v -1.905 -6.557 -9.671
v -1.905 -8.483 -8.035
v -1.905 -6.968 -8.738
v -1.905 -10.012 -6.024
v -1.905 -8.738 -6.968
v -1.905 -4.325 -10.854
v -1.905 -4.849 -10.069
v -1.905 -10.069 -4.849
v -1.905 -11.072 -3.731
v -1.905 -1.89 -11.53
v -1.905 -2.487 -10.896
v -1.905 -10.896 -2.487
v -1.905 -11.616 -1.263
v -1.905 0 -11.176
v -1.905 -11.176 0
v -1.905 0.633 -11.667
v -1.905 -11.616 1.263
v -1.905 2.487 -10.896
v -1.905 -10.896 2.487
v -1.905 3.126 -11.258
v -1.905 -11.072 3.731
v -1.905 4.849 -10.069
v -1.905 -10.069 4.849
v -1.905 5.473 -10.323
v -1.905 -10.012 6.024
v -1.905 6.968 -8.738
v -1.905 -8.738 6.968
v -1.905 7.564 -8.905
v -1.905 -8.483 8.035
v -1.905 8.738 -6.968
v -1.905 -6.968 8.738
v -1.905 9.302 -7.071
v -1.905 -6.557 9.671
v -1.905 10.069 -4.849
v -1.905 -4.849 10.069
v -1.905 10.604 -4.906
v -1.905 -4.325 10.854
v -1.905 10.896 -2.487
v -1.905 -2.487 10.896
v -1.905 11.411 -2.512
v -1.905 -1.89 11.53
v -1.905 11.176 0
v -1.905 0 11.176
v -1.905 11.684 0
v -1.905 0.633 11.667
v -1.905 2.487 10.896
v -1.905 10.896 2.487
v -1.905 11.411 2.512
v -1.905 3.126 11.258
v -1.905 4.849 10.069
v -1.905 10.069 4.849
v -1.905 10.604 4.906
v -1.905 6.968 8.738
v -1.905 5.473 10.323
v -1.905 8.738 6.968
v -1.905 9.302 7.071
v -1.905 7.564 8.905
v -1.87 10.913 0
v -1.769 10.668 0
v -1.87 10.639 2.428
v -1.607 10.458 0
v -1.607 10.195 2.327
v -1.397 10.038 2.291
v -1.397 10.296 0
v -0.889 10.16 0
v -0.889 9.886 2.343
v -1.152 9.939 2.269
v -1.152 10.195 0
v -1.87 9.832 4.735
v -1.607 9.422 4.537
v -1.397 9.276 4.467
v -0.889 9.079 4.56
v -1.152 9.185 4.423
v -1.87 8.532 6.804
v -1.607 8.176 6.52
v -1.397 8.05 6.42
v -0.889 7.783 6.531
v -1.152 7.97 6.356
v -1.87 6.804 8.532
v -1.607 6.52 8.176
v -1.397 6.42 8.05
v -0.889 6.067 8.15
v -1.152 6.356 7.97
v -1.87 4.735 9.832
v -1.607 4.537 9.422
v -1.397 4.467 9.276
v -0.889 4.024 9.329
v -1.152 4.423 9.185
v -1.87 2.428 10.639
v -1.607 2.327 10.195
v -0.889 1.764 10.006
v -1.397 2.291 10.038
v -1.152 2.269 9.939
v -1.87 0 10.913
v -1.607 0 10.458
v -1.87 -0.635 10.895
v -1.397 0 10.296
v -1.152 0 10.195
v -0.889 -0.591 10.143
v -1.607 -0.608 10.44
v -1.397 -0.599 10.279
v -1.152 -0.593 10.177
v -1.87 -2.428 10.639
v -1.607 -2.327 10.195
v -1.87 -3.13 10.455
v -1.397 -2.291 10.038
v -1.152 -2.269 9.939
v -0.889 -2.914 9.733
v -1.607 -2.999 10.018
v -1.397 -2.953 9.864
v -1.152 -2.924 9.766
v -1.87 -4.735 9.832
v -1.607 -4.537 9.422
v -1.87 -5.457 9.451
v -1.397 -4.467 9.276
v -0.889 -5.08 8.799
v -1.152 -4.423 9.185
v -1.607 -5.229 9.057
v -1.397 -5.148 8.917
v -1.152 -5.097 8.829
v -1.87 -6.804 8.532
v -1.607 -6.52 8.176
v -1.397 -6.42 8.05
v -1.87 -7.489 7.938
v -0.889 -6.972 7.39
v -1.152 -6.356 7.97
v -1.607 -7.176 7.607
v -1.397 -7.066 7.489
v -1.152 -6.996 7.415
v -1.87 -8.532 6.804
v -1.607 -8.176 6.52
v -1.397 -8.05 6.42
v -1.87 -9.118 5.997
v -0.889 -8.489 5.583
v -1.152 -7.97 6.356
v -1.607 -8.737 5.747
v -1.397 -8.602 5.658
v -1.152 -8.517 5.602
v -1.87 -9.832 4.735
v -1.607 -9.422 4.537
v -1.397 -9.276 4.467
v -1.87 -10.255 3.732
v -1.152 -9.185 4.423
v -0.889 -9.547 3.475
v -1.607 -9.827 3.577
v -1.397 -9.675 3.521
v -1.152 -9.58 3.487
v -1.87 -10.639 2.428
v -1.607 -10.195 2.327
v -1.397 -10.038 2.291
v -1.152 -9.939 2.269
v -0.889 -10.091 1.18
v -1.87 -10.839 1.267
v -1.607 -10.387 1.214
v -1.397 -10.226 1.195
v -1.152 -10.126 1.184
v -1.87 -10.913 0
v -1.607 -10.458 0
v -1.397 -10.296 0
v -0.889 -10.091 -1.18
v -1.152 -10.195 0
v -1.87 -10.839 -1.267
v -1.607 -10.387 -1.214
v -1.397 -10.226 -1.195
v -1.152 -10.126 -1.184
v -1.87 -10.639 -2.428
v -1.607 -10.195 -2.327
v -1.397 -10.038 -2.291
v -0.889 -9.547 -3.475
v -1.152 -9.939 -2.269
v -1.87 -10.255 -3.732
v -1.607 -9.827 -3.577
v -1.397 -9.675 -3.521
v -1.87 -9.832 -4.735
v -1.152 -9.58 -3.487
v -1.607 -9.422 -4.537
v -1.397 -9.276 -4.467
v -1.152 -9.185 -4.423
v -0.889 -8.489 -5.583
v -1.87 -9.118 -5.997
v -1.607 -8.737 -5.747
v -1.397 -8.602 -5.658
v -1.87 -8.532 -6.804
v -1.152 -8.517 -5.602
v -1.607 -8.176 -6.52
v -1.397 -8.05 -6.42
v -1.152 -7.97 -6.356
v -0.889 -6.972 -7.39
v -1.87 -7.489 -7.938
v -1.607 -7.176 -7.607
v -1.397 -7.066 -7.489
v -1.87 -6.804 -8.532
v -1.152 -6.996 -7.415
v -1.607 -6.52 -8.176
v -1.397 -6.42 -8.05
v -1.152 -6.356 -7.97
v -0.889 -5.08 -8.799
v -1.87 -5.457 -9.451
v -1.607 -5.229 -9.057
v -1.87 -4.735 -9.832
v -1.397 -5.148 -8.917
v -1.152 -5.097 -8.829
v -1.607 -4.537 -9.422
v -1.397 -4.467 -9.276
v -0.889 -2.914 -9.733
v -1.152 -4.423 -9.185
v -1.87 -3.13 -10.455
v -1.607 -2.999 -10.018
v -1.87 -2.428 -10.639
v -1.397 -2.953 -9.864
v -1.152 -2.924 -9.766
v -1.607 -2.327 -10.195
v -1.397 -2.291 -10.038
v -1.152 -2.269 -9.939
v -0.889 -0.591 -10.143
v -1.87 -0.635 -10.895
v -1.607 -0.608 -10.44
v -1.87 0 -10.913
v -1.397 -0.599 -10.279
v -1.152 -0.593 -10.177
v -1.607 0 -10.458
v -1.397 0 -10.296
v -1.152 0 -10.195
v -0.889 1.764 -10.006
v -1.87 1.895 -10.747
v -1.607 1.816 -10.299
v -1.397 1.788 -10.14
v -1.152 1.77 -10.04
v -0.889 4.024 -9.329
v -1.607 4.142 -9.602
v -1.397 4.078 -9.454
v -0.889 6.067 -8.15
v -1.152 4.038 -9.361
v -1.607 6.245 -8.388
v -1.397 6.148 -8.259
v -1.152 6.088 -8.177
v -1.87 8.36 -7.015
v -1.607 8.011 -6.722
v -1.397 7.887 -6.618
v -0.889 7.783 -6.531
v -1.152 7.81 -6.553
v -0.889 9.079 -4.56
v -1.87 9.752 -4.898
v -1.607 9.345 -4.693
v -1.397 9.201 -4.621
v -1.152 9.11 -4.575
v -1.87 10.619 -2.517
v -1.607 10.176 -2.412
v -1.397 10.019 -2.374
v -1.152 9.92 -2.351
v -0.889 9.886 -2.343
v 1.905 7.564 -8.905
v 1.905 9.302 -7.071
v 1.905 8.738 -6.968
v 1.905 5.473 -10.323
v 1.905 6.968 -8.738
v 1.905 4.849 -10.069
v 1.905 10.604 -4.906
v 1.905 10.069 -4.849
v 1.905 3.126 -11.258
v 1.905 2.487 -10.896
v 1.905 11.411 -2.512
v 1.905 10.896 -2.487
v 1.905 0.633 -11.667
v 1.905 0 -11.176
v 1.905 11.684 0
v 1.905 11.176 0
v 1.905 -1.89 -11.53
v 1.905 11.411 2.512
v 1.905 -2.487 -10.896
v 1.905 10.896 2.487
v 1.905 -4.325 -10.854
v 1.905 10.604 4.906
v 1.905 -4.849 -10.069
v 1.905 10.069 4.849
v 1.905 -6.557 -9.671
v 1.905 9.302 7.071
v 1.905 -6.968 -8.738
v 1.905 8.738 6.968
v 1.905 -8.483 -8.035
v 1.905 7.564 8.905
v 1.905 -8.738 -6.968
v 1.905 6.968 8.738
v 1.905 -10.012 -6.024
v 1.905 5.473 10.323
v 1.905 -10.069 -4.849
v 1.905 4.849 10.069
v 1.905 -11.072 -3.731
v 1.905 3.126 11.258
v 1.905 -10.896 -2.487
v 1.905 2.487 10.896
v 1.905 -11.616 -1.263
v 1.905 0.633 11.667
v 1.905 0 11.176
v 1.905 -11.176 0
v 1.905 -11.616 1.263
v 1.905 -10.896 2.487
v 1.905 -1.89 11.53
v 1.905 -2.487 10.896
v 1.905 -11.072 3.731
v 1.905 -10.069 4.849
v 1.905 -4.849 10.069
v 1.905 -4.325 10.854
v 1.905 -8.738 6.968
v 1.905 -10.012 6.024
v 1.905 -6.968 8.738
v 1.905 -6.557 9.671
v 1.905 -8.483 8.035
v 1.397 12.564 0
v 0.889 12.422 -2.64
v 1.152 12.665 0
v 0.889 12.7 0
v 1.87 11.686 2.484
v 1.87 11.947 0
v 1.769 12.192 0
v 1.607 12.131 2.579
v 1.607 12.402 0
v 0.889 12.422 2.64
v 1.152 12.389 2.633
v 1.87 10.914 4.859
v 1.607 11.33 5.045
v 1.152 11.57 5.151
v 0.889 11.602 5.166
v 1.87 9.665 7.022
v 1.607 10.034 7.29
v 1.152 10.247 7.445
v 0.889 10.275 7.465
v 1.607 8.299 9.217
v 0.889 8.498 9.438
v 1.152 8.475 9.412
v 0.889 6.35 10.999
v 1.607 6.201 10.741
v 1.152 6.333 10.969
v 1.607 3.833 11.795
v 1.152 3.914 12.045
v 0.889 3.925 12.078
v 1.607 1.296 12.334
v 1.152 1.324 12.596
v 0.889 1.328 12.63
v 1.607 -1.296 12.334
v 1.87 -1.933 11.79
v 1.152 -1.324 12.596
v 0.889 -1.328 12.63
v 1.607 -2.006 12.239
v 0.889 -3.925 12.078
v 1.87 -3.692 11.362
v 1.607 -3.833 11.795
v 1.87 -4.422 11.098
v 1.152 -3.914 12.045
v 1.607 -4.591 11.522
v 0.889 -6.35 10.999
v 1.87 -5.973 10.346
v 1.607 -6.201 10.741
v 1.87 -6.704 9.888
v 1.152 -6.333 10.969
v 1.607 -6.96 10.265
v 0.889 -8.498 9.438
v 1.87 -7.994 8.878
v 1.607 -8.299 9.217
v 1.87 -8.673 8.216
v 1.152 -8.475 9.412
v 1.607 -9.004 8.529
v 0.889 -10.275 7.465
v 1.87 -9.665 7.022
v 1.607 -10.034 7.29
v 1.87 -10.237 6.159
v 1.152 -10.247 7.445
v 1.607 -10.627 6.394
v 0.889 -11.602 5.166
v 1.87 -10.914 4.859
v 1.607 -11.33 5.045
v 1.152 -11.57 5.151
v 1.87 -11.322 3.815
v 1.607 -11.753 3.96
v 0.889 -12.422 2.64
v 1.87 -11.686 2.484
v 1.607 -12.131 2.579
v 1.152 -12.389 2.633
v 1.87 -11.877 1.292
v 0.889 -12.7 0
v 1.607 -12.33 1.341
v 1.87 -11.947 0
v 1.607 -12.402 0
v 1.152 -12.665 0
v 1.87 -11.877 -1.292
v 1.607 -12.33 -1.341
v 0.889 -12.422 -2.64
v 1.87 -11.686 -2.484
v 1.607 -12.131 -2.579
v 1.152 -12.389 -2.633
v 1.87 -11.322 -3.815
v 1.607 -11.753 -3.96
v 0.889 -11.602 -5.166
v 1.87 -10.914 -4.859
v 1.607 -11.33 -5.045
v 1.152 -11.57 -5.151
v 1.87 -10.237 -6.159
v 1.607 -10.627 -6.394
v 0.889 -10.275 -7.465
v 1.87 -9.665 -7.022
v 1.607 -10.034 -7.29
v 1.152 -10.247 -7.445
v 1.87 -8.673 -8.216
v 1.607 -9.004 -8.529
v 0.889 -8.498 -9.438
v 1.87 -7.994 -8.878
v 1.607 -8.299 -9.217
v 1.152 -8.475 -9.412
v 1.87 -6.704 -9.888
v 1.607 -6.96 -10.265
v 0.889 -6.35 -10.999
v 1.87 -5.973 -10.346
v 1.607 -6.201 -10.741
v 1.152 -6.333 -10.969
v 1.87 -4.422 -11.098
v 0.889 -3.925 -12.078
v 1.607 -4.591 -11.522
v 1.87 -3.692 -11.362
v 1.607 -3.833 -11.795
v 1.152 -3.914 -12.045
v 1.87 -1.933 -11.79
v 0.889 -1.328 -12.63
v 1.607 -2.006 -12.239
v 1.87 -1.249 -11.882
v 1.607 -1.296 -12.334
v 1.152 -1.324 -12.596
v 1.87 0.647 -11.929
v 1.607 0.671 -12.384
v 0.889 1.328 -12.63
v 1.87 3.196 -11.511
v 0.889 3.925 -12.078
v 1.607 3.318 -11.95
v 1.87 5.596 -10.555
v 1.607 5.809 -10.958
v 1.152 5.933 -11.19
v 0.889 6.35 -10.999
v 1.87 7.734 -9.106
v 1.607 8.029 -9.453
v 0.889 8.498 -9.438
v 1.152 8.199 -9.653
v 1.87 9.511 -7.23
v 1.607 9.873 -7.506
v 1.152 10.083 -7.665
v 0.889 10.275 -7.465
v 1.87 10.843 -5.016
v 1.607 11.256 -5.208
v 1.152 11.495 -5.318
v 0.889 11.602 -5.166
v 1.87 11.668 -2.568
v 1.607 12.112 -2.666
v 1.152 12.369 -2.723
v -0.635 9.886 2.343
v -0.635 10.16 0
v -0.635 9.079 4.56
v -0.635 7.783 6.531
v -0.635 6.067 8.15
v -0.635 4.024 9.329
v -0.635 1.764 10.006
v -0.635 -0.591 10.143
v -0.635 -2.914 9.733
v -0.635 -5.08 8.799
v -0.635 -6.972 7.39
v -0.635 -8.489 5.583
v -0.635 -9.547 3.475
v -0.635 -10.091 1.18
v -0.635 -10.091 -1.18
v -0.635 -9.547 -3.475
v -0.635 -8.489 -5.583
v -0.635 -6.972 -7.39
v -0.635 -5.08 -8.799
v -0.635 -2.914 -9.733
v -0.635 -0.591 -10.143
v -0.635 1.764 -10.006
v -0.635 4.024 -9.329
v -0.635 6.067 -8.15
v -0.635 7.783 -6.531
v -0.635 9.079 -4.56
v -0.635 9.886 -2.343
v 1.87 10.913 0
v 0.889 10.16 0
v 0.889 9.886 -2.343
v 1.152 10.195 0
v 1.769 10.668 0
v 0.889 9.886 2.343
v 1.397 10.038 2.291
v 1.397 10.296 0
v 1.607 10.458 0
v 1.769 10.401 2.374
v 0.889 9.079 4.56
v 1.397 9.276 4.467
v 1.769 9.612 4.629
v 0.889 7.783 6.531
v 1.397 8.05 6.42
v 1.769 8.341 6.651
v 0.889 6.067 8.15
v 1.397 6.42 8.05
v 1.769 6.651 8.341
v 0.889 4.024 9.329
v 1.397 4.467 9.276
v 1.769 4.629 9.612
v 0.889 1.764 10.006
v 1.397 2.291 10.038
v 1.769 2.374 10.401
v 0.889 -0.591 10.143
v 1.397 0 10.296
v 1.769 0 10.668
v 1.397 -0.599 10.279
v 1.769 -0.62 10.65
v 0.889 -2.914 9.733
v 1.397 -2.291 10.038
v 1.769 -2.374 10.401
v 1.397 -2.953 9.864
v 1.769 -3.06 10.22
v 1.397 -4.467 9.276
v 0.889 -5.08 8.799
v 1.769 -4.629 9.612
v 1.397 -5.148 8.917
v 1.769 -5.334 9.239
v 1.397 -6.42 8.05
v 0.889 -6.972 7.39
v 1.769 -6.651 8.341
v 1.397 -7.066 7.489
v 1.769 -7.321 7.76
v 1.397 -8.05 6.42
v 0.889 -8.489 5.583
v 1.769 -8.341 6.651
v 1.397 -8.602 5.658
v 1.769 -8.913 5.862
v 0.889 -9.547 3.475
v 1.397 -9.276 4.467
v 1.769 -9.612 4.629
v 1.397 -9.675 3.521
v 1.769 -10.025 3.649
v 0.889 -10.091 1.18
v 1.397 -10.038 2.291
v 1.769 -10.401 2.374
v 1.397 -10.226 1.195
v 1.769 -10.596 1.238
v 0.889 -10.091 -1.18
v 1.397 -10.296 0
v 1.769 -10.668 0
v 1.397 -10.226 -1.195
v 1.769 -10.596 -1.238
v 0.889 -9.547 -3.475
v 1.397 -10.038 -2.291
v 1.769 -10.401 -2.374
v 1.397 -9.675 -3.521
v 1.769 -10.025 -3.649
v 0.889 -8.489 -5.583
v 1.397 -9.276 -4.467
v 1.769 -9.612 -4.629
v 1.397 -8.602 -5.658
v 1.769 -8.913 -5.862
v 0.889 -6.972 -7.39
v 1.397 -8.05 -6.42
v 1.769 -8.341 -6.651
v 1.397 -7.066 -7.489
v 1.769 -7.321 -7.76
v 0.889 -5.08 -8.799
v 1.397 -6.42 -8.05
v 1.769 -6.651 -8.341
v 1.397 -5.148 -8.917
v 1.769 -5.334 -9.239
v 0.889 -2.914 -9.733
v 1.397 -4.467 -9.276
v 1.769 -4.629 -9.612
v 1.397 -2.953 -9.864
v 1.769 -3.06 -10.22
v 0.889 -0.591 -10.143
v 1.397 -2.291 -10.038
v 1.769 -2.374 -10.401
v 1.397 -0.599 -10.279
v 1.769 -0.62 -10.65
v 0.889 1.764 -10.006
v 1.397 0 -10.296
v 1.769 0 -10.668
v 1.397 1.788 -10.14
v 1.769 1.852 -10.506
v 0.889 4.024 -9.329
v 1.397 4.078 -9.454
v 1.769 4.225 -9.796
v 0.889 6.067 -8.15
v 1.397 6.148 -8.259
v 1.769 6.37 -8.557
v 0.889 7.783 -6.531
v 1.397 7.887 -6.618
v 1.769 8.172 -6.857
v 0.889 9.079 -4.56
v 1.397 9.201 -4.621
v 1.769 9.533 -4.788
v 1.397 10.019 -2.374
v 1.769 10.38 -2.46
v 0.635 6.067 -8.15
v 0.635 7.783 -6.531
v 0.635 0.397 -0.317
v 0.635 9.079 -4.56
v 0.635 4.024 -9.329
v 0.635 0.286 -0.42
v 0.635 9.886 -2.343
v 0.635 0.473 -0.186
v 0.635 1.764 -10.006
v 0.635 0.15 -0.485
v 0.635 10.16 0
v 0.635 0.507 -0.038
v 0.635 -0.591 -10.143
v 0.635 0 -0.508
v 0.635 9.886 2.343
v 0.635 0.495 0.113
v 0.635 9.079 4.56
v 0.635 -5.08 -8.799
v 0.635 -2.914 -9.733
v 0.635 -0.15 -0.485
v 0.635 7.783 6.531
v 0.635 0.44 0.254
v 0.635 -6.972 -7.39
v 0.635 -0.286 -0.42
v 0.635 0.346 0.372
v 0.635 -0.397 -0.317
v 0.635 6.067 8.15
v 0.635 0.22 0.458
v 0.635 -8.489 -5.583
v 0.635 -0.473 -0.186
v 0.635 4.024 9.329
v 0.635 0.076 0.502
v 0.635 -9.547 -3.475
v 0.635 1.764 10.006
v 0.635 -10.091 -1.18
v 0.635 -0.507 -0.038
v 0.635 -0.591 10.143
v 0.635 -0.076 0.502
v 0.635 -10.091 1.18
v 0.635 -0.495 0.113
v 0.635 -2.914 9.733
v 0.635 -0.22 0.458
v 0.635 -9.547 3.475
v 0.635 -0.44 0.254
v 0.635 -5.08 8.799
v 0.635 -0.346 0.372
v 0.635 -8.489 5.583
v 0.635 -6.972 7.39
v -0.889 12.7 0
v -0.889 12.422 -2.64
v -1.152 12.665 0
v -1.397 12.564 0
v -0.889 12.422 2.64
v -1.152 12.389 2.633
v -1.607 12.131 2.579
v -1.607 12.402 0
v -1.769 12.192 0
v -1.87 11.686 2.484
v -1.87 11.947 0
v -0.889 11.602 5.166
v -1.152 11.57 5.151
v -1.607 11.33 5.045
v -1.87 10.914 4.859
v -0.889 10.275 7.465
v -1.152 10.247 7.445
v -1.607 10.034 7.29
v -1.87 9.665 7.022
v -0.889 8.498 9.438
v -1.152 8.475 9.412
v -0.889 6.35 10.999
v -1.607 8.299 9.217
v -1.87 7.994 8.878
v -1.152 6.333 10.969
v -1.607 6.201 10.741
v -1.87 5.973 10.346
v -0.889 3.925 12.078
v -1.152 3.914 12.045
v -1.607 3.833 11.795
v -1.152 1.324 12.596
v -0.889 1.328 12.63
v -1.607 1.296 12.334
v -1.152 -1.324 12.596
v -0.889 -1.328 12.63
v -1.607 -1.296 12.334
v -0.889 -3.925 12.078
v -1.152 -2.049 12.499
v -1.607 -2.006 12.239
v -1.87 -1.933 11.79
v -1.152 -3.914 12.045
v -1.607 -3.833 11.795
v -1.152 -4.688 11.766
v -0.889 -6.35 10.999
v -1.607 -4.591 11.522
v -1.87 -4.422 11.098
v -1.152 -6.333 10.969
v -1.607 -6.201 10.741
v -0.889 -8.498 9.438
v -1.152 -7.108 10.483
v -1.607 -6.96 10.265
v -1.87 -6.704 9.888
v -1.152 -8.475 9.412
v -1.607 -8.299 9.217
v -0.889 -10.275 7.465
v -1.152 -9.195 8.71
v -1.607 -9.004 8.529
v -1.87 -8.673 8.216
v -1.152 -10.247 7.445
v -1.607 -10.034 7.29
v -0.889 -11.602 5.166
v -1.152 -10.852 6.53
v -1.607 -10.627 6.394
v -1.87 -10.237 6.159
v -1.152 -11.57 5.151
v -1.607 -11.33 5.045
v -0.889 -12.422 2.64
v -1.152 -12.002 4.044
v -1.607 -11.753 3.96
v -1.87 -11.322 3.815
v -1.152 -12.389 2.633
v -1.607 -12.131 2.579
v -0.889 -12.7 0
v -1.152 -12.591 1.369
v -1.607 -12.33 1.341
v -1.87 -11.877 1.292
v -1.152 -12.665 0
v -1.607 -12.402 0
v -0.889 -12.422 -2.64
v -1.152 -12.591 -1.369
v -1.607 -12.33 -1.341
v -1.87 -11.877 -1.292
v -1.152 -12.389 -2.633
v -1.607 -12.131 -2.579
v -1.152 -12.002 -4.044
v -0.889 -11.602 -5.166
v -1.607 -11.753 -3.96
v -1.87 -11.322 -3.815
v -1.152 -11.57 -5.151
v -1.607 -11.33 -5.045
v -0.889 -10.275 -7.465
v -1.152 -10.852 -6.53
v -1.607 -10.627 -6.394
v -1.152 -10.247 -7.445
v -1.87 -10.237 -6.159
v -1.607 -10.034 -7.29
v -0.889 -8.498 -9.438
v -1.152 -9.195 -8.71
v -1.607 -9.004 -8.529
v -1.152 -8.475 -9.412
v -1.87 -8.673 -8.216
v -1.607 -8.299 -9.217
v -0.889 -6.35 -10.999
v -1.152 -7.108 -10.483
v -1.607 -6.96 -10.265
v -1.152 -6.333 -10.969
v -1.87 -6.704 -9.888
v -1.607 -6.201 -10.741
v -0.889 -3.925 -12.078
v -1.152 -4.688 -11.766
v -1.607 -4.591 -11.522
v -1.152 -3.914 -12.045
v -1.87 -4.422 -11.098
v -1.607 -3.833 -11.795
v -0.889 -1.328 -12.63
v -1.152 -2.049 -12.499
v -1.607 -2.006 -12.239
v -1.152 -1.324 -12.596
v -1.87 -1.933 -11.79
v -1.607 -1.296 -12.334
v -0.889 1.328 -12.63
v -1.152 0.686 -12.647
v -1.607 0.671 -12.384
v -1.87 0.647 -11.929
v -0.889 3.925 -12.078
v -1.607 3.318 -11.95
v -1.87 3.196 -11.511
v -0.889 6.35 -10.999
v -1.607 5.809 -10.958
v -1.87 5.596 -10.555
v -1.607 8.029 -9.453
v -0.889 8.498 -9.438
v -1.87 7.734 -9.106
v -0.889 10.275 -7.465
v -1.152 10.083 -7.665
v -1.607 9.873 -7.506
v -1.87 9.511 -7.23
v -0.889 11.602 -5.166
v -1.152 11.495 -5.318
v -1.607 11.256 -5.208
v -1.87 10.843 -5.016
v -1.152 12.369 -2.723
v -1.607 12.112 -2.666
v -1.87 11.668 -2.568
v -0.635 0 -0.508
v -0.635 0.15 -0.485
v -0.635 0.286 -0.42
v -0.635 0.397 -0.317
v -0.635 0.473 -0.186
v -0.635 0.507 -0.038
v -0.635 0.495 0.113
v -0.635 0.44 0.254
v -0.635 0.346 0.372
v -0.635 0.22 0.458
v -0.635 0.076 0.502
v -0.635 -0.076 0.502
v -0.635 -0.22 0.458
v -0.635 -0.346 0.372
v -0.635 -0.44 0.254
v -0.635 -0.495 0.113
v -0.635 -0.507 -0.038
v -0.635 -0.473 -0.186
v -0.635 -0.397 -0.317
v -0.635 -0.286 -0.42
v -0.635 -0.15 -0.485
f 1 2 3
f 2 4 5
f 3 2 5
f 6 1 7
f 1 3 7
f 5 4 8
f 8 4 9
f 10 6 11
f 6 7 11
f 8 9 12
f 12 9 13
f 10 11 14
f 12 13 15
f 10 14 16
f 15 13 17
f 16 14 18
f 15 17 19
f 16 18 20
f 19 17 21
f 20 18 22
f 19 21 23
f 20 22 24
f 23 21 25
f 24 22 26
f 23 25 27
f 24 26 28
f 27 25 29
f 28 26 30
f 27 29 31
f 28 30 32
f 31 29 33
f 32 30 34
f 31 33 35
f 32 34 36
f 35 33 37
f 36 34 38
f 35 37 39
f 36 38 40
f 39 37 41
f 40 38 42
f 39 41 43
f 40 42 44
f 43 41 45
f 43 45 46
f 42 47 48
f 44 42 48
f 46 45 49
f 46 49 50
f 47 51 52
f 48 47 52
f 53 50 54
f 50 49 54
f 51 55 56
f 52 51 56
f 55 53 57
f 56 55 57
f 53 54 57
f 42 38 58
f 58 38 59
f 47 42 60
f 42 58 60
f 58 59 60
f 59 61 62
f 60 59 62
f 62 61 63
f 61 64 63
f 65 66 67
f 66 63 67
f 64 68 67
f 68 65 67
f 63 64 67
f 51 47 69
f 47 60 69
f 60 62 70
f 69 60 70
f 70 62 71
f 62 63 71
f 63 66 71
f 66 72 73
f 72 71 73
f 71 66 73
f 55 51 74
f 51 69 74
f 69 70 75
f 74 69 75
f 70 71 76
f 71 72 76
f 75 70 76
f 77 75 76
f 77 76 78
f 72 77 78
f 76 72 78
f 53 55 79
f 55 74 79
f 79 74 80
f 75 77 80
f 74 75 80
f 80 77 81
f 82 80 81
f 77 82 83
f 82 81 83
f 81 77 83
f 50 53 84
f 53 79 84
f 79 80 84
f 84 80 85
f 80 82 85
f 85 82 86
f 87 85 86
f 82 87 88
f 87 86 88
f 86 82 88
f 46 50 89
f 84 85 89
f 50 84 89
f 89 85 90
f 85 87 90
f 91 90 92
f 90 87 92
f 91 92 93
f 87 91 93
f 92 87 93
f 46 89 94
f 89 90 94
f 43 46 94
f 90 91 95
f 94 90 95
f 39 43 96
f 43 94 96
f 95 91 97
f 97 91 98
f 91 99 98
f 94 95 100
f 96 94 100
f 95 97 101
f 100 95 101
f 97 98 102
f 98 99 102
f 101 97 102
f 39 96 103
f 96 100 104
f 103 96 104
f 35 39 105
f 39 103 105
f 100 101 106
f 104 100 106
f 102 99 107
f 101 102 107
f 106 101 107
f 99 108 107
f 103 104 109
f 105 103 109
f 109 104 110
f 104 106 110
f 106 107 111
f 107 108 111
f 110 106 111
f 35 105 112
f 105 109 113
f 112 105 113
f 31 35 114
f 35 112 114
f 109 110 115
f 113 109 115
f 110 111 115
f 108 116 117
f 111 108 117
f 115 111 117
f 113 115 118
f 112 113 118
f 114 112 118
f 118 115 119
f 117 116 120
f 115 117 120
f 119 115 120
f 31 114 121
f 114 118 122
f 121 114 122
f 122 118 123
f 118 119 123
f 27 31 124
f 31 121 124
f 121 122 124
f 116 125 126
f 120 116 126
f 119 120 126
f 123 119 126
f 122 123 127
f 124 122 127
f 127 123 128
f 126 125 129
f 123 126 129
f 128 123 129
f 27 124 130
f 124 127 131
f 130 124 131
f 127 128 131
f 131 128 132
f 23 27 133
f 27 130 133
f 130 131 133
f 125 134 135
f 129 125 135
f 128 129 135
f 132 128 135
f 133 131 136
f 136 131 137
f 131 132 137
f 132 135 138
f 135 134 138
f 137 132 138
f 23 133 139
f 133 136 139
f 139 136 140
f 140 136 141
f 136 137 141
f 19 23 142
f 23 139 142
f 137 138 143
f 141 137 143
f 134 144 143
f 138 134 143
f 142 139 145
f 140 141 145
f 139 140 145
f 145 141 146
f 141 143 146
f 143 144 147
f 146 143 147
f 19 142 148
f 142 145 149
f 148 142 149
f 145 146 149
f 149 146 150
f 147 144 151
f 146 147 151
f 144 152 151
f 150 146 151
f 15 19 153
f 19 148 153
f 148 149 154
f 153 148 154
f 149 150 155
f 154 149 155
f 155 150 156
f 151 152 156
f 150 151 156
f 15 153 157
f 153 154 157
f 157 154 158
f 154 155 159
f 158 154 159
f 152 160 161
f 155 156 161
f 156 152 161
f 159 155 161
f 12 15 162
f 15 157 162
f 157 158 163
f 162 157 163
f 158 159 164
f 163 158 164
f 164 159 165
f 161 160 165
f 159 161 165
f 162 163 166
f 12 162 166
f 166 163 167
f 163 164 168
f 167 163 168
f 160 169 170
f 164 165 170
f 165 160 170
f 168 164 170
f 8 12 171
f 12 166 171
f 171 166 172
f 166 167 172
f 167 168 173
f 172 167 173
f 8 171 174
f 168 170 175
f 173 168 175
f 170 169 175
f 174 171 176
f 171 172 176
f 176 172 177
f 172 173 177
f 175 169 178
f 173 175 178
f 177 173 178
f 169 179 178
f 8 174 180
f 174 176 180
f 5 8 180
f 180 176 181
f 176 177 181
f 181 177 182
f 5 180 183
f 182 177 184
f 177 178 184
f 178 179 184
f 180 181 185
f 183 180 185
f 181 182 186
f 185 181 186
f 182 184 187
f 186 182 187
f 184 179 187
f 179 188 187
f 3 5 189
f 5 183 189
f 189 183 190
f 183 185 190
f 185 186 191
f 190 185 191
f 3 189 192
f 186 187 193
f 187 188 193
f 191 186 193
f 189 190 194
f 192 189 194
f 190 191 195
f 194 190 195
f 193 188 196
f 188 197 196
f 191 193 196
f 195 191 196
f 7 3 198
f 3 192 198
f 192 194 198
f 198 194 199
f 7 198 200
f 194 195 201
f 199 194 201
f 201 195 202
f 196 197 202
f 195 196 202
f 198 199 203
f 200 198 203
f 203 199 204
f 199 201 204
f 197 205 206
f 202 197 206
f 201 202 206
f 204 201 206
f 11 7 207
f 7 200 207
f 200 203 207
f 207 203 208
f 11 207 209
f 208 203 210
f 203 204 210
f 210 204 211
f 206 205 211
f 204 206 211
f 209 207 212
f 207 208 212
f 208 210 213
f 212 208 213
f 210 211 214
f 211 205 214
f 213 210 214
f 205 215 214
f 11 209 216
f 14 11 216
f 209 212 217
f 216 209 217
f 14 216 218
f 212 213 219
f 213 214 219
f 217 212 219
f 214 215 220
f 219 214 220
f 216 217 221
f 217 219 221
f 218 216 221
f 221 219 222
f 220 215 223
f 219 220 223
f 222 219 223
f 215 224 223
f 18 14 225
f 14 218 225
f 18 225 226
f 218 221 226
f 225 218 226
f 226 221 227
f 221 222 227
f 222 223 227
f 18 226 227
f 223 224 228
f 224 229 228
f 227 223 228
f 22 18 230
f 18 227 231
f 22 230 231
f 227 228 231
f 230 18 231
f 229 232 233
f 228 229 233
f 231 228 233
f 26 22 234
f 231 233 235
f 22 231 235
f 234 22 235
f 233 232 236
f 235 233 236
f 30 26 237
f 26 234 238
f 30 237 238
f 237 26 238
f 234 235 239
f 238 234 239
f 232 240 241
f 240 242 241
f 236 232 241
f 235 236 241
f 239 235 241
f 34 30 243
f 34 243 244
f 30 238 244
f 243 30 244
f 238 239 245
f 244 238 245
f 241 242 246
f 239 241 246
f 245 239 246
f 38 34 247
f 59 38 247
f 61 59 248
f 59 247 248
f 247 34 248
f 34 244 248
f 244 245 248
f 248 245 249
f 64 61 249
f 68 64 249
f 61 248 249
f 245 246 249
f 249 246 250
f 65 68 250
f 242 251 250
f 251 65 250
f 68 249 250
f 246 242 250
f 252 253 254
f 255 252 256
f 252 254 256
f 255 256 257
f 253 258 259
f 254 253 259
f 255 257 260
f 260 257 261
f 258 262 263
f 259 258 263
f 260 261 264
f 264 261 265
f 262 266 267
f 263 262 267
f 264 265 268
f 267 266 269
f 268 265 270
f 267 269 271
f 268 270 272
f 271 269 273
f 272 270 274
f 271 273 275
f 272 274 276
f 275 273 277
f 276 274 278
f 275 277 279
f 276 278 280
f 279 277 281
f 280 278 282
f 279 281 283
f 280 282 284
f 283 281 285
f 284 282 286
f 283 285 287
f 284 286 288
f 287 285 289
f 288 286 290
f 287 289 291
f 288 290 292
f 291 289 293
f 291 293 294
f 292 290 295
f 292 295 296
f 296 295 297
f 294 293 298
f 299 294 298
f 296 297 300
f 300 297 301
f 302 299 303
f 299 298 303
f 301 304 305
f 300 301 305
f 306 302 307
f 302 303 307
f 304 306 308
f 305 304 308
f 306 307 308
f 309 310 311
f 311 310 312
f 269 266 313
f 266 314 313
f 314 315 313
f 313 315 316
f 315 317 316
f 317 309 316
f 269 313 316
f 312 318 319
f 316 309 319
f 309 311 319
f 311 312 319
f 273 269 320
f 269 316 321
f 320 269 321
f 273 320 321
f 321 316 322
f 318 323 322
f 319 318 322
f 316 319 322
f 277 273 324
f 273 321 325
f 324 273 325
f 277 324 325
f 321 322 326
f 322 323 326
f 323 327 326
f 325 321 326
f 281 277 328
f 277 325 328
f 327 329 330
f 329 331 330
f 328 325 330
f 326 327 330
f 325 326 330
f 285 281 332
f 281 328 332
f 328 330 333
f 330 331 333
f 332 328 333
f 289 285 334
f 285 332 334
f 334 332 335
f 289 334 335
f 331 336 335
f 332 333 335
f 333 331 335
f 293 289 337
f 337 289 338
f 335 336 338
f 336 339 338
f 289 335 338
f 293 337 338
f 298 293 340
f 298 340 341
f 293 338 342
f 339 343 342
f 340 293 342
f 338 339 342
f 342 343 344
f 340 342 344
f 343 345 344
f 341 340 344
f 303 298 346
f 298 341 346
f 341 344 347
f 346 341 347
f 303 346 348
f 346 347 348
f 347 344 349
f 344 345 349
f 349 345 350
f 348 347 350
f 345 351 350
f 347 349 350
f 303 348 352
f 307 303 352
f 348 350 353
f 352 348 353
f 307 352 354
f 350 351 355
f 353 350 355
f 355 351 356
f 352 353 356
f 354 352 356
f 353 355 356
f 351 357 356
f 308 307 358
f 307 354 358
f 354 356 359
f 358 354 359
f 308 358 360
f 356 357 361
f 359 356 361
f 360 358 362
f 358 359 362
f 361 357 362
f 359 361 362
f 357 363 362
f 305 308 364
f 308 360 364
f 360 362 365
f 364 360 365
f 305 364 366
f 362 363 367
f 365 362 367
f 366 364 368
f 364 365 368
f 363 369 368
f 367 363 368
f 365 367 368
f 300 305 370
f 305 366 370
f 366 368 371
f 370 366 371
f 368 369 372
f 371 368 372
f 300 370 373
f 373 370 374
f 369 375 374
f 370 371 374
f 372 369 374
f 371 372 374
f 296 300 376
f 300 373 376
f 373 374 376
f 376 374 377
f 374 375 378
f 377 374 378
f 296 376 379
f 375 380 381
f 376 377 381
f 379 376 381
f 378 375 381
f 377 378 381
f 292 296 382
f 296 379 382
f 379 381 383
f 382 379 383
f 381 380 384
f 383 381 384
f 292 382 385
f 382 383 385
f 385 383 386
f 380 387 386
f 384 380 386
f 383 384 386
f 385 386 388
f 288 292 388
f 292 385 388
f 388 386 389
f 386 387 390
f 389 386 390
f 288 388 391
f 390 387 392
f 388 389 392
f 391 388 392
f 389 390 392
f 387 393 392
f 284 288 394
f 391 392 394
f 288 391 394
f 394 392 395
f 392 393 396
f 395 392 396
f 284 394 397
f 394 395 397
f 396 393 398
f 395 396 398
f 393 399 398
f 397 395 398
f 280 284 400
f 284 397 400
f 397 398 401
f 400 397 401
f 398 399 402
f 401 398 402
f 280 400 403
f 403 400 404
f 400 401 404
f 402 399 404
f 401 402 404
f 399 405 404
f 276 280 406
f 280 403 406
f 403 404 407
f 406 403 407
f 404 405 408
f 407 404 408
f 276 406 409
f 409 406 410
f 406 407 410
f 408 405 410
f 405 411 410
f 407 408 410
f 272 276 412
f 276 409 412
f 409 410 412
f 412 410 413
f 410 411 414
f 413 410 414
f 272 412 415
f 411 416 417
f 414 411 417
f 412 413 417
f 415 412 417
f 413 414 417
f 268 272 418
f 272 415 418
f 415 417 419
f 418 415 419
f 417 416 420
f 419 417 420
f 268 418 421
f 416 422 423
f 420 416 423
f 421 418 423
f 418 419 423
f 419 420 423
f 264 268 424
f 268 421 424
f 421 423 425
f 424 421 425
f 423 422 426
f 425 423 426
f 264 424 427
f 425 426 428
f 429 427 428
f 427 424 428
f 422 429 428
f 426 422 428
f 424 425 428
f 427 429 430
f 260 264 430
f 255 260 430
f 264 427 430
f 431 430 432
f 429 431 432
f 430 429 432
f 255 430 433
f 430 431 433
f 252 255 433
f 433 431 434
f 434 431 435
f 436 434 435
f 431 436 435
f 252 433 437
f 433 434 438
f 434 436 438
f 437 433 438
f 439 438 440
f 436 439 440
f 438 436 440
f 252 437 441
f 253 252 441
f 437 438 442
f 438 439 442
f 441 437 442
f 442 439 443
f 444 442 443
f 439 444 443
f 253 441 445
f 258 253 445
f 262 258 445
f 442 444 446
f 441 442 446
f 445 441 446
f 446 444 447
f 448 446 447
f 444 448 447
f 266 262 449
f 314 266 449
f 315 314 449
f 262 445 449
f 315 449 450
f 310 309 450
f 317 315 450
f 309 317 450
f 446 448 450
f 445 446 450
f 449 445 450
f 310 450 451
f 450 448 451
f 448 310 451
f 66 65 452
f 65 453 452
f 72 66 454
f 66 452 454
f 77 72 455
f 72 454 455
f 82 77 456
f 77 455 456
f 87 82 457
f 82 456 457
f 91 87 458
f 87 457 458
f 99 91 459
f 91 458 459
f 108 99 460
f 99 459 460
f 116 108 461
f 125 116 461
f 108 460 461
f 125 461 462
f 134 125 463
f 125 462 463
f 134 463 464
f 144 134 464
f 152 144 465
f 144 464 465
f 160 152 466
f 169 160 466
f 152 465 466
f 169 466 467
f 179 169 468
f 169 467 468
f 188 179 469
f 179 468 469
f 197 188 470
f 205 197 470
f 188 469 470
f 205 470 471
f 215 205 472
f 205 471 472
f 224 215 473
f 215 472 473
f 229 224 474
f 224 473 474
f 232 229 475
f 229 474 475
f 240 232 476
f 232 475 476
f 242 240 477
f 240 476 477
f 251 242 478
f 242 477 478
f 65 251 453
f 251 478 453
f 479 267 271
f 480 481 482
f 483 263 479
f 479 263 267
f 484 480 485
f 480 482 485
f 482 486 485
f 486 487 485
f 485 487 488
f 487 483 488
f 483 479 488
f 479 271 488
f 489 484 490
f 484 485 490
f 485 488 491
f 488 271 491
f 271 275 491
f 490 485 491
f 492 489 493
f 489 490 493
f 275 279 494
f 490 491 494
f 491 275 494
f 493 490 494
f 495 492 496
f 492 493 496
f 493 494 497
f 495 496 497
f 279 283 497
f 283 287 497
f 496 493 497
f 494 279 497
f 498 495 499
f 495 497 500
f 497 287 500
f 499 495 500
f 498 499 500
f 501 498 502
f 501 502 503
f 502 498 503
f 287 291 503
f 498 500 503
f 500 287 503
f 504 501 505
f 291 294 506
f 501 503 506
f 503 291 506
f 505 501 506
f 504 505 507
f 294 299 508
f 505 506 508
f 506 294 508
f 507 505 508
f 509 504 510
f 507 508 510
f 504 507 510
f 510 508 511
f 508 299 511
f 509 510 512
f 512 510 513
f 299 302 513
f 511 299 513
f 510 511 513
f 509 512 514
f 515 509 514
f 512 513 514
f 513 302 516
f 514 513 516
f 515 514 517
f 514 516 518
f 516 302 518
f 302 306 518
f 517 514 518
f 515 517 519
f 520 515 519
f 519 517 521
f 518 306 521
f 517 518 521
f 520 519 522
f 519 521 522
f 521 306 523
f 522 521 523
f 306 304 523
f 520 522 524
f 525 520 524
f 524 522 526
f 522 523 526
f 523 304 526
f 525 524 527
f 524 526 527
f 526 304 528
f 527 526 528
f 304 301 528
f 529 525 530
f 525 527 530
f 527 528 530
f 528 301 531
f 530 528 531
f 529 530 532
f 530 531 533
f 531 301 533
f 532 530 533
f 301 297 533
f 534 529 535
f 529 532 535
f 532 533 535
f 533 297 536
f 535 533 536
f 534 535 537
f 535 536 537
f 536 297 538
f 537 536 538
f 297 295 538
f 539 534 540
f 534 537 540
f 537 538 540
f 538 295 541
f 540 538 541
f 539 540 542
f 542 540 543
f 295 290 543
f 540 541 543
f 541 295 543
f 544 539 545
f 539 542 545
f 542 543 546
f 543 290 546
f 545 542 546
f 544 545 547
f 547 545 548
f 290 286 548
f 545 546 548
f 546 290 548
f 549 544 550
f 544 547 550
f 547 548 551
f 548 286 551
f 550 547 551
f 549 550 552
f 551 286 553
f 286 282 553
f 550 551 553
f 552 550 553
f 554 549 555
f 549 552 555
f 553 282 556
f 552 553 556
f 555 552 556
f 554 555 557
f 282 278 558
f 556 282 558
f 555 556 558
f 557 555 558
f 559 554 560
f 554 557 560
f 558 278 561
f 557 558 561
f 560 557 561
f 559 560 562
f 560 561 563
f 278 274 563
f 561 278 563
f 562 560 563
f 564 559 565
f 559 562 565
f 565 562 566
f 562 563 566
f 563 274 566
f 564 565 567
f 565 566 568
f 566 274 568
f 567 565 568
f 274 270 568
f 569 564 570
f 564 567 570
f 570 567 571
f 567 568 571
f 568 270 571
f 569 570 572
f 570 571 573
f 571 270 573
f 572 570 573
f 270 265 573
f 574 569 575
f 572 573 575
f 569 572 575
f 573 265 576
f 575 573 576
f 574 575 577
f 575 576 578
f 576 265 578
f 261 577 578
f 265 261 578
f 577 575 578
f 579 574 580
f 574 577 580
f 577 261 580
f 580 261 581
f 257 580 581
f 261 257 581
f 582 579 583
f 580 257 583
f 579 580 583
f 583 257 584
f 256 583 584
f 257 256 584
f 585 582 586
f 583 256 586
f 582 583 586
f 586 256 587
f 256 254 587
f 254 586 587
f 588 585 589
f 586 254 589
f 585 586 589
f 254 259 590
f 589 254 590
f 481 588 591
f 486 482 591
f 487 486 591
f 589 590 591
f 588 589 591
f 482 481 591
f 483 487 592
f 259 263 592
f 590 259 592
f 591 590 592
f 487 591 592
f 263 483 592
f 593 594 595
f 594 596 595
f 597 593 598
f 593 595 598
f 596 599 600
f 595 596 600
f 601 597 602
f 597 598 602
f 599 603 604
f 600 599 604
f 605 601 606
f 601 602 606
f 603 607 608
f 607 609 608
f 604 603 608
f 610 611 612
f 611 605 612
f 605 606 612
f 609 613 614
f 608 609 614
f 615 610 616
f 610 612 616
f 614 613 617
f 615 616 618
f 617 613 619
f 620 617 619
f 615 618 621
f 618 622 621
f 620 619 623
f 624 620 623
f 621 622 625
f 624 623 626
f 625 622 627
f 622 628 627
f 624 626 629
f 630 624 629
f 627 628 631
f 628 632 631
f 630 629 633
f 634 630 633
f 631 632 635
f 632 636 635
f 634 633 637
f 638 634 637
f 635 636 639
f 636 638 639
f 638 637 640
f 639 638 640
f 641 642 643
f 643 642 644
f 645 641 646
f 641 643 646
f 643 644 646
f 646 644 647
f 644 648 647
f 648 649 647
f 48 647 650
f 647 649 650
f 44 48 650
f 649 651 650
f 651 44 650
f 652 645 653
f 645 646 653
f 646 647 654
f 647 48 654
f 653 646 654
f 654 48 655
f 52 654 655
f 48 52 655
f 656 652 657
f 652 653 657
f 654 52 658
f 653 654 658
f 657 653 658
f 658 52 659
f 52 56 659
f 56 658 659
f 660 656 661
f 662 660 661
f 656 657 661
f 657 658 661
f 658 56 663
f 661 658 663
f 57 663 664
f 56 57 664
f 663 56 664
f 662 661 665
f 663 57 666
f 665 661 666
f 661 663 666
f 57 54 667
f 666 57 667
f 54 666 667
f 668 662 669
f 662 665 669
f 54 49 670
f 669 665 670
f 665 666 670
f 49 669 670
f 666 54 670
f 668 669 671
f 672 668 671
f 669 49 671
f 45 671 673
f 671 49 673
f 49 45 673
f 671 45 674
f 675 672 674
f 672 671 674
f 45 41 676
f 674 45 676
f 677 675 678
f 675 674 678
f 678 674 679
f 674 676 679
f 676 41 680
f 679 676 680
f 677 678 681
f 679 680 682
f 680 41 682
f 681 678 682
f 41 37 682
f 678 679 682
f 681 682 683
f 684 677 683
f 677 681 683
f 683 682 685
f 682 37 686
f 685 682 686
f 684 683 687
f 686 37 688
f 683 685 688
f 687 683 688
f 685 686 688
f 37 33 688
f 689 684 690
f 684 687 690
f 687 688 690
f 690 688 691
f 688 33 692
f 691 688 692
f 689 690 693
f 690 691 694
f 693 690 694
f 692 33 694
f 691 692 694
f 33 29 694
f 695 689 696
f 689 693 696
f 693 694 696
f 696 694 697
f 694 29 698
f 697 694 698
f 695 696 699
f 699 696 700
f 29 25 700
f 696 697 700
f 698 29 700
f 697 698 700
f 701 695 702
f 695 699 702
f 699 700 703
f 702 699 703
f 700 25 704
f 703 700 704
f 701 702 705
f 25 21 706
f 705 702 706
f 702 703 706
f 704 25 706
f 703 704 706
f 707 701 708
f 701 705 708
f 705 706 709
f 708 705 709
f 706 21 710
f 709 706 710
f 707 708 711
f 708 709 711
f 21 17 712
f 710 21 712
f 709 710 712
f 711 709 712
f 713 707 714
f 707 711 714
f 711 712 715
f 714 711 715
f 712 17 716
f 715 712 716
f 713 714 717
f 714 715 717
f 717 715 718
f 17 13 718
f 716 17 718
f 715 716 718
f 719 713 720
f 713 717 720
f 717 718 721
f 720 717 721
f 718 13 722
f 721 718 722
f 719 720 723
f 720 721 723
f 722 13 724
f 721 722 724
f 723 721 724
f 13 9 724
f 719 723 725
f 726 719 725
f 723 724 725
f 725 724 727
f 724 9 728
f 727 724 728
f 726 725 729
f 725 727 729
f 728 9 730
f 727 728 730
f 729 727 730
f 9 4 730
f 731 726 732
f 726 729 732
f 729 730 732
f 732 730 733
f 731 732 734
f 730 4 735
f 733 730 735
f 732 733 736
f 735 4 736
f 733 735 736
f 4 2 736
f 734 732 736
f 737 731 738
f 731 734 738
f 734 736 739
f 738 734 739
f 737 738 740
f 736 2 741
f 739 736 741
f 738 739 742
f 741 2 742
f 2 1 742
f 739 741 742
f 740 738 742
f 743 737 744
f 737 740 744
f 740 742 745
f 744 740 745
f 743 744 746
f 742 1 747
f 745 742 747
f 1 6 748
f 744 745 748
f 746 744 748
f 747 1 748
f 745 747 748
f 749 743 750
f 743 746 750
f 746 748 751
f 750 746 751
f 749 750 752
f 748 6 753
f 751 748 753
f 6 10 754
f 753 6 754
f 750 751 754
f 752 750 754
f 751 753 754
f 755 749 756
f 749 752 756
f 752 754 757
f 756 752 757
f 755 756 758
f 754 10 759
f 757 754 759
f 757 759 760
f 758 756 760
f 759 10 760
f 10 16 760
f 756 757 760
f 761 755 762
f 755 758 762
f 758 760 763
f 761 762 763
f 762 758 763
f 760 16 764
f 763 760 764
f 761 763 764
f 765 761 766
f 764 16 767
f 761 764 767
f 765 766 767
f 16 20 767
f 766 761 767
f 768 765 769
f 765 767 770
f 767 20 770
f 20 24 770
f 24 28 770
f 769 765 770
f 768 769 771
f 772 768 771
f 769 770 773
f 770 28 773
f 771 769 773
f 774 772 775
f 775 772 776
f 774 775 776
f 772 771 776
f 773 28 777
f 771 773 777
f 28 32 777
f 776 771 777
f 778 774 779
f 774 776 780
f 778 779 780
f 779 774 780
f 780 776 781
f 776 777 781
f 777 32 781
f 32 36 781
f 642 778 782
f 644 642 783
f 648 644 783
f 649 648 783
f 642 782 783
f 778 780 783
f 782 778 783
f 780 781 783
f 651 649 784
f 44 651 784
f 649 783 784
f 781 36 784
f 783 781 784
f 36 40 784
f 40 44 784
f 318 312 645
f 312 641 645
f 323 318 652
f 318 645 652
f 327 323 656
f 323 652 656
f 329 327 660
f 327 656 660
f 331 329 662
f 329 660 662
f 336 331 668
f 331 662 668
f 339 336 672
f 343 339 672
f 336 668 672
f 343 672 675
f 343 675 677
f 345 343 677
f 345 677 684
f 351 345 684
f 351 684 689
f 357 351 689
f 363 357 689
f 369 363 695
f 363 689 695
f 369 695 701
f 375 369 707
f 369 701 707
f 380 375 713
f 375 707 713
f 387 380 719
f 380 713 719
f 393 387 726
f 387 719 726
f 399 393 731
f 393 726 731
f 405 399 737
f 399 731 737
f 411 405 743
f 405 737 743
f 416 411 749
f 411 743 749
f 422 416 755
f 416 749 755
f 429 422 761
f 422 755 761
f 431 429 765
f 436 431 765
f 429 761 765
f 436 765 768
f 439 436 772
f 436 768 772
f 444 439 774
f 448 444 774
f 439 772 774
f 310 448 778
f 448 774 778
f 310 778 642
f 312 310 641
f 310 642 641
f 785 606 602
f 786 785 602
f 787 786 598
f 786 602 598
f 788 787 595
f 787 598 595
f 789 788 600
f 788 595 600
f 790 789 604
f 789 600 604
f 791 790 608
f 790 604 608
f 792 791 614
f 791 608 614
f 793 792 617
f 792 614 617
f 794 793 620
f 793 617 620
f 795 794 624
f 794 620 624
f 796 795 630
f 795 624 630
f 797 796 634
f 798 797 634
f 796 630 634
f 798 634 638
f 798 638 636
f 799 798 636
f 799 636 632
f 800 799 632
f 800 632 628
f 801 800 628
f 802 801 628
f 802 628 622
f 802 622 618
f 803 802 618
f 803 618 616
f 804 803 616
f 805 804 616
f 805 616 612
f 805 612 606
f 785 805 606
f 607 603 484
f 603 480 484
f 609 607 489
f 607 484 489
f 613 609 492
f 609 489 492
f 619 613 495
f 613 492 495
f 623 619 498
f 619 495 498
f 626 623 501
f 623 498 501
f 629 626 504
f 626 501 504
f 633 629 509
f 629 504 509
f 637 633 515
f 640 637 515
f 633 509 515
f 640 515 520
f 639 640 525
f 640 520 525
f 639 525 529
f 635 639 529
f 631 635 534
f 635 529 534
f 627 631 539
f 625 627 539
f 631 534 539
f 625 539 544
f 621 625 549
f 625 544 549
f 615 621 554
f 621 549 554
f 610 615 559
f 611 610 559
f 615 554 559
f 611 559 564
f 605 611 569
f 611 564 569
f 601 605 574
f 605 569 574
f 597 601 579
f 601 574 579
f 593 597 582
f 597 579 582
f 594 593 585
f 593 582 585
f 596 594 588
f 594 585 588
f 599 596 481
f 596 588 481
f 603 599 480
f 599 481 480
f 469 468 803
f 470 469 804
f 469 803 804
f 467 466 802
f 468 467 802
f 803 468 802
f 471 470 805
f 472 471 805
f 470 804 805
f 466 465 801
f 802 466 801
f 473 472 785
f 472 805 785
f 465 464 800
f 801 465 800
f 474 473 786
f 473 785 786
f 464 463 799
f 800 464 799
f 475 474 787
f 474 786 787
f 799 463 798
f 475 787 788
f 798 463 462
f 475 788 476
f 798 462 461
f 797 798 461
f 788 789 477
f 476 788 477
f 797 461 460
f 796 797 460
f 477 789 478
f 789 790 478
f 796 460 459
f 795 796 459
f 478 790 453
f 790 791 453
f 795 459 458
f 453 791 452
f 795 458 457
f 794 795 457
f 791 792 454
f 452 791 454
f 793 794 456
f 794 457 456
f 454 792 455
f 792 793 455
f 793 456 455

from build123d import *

# Parameters (mm, degrees)
SKETCH3_R          = 0.508
CUT_EXTRUDE1_DEPTH = 3.54


with BuildPart() as part:
    # Sketch2 → Revolve1 (revolve)
    with BuildSketch(Plane.XY):
        with BuildLine():
            Line((0.889, 12.7), (-0.889, 12.7))
            ThreePointArc((-0.889, 12.7), (-1.60742049, 12.40242049), (-1.905, 11.684))
            Line((-1.905, 11.684), (-1.905, 11.176))
            ThreePointArc((-1.905, 11.176), (-1.60742049, 10.45757951), (-0.889, 10.16))
            Line((-0.889, 10.16), (-0.635, 10.16))
            Line((-0.635, 10.16), (-0.635, 0))
            Line((-0.635, 0), (0.635, 0))
            Line((0.635, 0), (0.635, 10.16))
            Line((0.635, 10.16), (0.889, 10.16))
            ThreePointArc((0.889, 10.16), (1.60742049, 10.45757951), (1.905, 11.176))
            Line((1.905, 11.176), (1.905, 11.684))
            ThreePointArc((1.905, 11.684), (1.60742049, 12.40242049), (0.889, 12.7))
        make_face()
    revolve(axis=Axis((-0.635, 0, 0), (1, 0, 0)))

    # Sketch3 → Cut-Extrude1 (cut, through all)
    with BuildSketch(Plane(origin=(0.635, 0, 0), x_dir=(0, 0, -1), z_dir=(1, 0, 0))):
        Circle(SKETCH3_R)
    extrude(amount=-CUT_EXTRUDE1_DEPTH, mode=Mode.SUBTRACT)


solid = part.part
